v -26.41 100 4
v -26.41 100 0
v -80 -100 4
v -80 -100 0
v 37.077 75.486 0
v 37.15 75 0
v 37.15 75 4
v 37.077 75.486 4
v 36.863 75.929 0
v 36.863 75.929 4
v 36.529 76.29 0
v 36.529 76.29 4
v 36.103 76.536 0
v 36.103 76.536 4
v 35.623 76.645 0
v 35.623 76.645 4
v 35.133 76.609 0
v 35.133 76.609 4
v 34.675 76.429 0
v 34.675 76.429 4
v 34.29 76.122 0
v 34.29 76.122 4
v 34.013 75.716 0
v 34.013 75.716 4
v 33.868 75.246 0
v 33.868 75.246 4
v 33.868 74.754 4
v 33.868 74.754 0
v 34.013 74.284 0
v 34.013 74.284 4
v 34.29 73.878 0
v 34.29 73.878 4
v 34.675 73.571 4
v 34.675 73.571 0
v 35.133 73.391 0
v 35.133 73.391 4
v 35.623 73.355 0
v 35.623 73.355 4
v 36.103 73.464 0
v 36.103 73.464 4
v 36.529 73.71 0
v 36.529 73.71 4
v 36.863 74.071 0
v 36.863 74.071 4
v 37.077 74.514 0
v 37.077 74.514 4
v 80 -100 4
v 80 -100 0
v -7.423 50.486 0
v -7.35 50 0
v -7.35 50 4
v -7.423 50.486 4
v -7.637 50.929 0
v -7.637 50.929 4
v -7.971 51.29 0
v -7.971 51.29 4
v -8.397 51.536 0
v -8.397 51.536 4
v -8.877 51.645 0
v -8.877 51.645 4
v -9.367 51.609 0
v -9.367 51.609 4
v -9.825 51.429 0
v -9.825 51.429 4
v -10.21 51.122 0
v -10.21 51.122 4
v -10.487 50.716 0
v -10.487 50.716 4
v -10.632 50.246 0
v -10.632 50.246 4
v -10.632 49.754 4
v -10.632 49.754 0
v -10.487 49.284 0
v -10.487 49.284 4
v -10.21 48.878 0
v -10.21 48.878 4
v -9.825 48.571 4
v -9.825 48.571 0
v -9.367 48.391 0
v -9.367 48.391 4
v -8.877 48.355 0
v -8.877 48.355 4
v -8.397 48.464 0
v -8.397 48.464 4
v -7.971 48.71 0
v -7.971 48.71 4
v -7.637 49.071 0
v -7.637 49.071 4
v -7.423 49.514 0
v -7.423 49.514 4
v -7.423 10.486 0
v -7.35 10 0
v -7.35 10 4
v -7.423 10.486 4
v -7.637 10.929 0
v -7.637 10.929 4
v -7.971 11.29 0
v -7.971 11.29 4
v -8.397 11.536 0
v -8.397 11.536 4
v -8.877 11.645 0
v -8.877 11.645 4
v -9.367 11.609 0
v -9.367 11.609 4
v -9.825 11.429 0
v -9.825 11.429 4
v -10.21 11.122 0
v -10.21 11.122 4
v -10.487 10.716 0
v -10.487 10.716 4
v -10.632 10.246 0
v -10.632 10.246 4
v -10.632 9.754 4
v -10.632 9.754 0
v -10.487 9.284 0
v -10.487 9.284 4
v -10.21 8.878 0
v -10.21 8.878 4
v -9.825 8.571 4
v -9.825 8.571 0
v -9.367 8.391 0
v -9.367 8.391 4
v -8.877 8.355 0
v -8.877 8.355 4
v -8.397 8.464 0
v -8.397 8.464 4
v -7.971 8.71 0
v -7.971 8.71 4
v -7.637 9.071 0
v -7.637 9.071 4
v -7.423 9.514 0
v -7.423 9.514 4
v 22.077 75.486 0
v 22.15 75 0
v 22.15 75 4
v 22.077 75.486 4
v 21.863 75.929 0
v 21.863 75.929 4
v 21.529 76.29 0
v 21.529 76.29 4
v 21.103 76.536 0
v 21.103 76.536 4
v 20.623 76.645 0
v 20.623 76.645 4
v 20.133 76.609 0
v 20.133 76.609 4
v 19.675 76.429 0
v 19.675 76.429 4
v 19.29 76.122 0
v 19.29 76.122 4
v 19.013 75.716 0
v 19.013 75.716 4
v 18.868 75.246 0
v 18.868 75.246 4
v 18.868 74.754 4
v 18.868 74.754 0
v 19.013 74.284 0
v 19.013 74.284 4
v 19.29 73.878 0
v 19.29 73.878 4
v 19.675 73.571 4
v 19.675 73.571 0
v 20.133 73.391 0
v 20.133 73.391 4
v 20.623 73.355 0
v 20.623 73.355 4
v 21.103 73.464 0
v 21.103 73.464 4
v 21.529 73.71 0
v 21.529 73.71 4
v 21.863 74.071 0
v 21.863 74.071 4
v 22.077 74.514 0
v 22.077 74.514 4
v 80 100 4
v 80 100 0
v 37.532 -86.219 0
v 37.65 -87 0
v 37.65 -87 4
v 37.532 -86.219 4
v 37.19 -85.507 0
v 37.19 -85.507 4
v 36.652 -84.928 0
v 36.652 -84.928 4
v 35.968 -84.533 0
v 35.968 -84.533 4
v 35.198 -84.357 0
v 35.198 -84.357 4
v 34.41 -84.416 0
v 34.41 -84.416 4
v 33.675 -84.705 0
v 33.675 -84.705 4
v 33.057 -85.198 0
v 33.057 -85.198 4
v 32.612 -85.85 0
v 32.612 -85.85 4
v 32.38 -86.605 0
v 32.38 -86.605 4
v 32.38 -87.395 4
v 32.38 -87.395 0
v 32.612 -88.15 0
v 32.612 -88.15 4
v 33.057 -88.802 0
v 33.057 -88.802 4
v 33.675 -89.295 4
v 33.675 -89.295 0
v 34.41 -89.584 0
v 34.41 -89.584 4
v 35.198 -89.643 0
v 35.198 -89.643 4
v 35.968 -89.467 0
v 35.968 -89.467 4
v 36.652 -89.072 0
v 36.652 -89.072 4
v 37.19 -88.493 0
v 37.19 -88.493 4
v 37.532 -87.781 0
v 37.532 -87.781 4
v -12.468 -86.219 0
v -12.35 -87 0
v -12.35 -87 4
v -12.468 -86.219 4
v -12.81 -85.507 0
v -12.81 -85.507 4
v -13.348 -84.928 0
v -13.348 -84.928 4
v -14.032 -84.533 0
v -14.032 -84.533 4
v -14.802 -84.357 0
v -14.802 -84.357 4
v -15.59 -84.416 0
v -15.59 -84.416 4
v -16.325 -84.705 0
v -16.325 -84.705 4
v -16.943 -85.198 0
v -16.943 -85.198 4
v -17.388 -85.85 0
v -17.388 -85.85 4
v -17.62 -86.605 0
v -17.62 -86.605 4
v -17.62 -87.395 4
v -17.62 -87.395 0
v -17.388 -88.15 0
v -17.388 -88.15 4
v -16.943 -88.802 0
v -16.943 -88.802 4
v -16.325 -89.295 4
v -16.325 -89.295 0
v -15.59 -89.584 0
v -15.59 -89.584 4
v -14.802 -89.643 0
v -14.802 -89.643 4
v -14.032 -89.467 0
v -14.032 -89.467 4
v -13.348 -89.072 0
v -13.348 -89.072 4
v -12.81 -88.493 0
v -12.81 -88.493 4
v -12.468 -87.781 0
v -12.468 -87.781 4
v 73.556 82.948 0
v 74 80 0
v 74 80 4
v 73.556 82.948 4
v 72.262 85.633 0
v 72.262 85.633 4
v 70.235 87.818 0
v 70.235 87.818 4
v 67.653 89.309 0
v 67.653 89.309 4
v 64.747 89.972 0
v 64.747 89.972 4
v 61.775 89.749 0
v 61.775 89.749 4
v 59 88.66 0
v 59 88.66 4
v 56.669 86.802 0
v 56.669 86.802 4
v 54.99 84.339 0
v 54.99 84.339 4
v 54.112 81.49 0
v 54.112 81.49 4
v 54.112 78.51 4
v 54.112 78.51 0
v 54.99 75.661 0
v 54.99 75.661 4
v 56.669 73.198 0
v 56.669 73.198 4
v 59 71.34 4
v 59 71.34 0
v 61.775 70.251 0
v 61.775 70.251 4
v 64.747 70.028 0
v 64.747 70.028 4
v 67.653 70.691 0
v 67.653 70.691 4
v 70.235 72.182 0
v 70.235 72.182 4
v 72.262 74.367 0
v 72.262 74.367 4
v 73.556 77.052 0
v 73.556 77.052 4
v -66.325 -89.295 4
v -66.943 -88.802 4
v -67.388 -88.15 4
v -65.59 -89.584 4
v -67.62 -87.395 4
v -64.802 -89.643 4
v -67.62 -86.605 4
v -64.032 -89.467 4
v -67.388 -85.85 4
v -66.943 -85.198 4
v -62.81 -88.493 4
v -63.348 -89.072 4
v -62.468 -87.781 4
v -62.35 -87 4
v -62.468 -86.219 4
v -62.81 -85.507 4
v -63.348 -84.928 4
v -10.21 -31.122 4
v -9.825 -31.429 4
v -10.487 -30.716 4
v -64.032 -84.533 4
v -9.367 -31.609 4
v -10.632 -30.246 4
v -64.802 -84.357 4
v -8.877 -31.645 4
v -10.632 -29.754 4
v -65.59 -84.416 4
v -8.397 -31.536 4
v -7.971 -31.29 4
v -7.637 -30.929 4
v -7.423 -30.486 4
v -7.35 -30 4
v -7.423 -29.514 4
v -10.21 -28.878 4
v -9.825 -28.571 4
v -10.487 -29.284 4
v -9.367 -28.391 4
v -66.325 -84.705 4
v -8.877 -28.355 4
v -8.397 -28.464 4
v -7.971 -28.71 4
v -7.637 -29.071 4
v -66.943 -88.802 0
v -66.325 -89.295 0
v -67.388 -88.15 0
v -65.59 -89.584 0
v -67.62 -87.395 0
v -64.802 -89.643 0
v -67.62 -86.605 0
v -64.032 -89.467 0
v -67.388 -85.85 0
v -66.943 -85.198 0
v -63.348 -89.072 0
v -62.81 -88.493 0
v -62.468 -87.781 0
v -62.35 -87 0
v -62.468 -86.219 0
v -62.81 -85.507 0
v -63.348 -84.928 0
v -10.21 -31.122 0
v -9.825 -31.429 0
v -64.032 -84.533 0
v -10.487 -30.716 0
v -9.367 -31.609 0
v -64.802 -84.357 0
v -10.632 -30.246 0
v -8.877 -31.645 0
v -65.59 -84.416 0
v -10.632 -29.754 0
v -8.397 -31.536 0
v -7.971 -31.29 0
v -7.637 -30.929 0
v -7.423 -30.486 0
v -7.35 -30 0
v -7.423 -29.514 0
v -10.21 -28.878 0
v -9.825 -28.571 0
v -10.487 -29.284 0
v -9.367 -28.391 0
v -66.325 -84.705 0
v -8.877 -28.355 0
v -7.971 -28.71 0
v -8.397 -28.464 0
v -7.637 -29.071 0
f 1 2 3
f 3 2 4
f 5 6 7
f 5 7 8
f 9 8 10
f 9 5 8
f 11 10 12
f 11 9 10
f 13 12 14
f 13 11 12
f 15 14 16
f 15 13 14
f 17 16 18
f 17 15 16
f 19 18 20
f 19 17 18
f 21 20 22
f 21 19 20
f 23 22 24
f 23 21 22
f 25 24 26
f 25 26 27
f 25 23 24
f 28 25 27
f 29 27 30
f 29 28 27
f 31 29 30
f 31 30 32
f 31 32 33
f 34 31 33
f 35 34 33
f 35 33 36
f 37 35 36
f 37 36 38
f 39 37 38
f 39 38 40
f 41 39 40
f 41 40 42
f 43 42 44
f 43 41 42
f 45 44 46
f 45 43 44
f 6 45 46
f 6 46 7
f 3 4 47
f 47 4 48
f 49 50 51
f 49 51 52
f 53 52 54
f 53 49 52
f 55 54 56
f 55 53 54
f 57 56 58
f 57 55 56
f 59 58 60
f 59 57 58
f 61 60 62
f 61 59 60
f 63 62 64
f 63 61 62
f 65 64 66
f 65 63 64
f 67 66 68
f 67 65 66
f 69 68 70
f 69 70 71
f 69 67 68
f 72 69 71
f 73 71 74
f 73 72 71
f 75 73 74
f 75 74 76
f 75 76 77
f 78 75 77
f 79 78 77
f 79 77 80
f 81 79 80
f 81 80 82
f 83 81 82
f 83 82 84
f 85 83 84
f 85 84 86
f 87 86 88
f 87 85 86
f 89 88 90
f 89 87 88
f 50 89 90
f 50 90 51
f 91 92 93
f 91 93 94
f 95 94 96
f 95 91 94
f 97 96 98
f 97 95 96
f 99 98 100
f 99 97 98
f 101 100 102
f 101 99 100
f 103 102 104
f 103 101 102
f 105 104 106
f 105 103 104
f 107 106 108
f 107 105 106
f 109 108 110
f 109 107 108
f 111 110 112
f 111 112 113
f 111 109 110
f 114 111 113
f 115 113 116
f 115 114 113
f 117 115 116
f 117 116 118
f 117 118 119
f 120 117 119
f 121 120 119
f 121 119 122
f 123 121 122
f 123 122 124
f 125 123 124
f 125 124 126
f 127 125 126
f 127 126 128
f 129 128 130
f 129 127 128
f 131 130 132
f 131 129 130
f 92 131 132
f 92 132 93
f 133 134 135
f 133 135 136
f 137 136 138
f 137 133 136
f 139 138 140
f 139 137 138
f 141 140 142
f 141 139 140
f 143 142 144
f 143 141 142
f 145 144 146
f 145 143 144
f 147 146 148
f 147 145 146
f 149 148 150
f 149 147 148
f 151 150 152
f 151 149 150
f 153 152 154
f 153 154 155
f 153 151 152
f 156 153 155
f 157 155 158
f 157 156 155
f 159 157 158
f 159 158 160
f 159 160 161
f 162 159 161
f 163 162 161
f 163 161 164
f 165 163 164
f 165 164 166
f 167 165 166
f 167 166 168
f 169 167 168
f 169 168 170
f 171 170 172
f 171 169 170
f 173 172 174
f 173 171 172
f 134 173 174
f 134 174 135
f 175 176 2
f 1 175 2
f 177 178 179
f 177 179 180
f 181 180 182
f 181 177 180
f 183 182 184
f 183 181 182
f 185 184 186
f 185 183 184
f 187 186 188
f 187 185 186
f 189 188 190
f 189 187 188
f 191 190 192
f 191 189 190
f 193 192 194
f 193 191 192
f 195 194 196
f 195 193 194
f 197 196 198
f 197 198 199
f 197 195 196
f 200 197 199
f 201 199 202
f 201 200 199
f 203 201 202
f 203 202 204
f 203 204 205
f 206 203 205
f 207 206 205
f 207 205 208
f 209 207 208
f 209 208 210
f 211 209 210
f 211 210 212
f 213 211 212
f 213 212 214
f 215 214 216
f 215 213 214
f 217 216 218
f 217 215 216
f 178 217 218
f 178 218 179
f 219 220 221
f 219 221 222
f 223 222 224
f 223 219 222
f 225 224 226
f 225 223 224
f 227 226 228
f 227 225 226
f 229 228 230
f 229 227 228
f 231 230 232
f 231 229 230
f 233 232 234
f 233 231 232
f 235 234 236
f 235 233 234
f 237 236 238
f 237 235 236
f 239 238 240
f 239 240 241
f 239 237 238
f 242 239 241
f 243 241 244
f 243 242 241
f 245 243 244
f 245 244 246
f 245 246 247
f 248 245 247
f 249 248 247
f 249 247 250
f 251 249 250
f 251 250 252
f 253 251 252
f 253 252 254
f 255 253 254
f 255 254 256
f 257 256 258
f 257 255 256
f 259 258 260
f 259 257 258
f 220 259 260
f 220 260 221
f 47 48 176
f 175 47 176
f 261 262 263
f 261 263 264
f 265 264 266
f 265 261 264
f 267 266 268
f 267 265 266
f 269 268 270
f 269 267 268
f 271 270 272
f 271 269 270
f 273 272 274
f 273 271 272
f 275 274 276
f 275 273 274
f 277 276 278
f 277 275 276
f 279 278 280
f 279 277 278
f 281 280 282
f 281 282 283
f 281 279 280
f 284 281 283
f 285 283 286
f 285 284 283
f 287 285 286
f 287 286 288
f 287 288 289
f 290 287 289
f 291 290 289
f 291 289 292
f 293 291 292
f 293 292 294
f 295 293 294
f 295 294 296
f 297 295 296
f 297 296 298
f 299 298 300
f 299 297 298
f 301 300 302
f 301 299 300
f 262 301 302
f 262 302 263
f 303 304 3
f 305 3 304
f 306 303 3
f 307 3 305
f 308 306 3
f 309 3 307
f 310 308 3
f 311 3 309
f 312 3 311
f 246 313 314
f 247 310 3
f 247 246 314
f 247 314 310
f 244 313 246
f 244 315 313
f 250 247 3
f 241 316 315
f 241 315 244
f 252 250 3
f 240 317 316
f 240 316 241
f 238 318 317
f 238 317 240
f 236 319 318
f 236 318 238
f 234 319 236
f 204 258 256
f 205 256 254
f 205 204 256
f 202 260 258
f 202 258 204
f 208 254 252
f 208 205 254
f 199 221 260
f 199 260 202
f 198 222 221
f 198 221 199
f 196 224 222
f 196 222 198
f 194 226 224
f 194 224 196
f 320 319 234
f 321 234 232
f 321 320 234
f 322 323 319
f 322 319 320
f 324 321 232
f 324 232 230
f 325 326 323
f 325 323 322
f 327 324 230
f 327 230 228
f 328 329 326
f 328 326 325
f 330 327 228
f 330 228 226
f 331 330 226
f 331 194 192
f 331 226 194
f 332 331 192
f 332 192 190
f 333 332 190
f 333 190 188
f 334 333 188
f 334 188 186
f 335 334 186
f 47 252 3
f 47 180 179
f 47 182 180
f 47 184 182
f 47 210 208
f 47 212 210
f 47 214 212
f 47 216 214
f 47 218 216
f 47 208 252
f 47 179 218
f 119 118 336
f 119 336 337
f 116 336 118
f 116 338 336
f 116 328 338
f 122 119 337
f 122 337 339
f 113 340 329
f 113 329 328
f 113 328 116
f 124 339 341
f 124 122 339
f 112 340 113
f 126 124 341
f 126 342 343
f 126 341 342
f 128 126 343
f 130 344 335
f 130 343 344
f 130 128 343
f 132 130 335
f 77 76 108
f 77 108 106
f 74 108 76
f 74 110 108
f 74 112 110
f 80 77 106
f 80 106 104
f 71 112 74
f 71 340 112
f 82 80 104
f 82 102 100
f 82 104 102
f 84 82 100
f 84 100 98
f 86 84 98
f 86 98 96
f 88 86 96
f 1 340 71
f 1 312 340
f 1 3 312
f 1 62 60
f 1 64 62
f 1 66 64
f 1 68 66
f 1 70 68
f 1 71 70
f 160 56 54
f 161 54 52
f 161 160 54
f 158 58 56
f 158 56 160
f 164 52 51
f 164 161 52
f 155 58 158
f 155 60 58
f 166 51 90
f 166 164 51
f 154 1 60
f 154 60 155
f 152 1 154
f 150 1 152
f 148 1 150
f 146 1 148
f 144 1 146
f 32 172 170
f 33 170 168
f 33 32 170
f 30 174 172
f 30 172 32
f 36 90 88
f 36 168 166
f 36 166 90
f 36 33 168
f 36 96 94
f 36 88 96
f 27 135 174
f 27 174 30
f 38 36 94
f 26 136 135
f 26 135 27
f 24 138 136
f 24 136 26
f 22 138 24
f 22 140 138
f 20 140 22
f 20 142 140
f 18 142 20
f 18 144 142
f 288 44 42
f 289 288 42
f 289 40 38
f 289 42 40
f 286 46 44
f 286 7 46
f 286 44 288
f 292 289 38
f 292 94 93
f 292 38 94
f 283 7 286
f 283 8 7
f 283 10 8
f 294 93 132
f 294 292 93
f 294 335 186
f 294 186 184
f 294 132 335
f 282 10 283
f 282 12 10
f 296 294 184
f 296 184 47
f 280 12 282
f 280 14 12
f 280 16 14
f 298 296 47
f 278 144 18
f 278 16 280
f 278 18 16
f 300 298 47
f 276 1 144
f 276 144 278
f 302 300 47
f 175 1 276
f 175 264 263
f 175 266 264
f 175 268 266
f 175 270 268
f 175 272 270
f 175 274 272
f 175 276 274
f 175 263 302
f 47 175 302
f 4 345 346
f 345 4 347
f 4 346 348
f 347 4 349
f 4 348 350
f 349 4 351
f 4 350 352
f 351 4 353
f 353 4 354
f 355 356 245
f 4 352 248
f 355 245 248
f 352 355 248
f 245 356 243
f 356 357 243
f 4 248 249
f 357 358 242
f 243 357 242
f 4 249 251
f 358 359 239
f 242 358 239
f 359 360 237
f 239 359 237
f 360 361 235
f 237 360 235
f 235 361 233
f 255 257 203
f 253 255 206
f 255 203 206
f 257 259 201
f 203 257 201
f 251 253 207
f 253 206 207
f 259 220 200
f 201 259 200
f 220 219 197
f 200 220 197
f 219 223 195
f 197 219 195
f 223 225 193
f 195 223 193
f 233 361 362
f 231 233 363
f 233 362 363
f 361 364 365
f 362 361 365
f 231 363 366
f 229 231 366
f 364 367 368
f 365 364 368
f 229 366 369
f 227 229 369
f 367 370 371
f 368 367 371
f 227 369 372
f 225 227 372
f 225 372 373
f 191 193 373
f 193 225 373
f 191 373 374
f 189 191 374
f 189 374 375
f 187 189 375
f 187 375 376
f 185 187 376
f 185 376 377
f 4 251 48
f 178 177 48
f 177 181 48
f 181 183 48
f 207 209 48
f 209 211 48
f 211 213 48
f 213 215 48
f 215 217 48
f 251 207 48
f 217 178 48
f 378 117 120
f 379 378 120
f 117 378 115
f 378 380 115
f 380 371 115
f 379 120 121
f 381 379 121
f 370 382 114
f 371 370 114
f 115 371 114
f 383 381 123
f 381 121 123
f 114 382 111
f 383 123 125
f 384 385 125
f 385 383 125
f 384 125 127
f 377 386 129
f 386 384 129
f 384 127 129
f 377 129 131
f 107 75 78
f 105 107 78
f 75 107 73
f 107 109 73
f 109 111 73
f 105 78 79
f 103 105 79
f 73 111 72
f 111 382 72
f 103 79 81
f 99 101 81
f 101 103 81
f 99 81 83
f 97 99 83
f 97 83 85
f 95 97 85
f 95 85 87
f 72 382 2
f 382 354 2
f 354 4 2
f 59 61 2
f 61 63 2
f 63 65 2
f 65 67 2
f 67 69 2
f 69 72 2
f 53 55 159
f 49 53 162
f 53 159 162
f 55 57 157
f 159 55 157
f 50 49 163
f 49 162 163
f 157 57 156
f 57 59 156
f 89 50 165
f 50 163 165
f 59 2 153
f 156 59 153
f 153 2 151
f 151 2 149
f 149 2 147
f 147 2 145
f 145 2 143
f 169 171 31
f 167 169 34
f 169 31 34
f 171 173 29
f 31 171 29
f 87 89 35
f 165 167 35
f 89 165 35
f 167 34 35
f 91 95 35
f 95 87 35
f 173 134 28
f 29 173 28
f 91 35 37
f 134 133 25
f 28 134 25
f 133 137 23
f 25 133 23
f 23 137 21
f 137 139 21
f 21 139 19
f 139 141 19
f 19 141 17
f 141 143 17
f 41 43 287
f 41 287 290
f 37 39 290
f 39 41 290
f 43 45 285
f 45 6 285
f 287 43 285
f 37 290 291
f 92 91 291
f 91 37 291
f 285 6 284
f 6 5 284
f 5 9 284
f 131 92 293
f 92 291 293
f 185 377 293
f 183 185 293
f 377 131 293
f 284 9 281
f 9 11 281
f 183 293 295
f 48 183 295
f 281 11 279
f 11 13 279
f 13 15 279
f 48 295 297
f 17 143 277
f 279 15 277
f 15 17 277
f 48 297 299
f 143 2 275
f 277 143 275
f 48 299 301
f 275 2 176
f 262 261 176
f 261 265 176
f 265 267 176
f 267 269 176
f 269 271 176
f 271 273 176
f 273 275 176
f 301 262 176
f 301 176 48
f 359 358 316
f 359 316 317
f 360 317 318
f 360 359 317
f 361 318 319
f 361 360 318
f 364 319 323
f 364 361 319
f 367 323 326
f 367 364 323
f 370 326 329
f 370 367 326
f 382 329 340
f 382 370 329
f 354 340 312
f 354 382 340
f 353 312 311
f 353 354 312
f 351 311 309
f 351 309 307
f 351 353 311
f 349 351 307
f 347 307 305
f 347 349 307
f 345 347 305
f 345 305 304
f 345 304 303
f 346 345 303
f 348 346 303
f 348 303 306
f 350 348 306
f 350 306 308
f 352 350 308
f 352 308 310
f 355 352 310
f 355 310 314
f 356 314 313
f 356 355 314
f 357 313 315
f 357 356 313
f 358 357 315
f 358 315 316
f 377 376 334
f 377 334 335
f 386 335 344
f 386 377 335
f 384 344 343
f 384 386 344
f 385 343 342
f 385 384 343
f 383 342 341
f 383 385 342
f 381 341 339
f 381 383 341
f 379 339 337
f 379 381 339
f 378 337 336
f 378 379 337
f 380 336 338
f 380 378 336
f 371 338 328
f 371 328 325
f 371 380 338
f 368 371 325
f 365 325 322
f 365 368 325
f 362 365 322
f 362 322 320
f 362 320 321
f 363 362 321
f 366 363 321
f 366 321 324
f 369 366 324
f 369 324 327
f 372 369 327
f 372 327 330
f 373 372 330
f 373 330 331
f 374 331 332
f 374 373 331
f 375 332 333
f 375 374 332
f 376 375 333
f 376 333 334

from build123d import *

# Parameters (mm, degrees)
SKETCH_2_R      = 2.65
SKETCH_2_R_2    = 1.65
SKETCH_2_R_3    = 10
EXTRUDE_1_DEPTH = 4


with BuildPart() as part:
    # 草图2 → 凸台-拉伸1 (new body)
    with BuildSketch(Plane.XY):
        Polygon((80, 100), (-26.410161514, 100), (-80, -100), (80, -100), align=None)
        with Locations((-65, -87)):
            Circle(SKETCH_2_R, mode=Mode.SUBTRACT)
        with Locations((-15, -87)):
            Circle(SKETCH_2_R, mode=Mode.SUBTRACT)
        with Locations((-9, -30)):
            Circle(SKETCH_2_R_2, mode=Mode.SUBTRACT)
        with Locations((35, -87)):
            Circle(SKETCH_2_R, mode=Mode.SUBTRACT)
        with Locations((-9, 10)):
            Circle(SKETCH_2_R_2, mode=Mode.SUBTRACT)
        with Locations((-9, 50)):
            Circle(SKETCH_2_R_2, mode=Mode.SUBTRACT)
        with Locations((20.5, 75)):
            Circle(SKETCH_2_R_2, mode=Mode.SUBTRACT)
        with Locations((35.5, 75)):
            Circle(SKETCH_2_R_2, mode=Mode.SUBTRACT)
        with Locations((64, 80)):
            Circle(SKETCH_2_R_3, mode=Mode.SUBTRACT)
    extrude(amount=EXTRUDE_1_DEPTH)


solid = part.part
